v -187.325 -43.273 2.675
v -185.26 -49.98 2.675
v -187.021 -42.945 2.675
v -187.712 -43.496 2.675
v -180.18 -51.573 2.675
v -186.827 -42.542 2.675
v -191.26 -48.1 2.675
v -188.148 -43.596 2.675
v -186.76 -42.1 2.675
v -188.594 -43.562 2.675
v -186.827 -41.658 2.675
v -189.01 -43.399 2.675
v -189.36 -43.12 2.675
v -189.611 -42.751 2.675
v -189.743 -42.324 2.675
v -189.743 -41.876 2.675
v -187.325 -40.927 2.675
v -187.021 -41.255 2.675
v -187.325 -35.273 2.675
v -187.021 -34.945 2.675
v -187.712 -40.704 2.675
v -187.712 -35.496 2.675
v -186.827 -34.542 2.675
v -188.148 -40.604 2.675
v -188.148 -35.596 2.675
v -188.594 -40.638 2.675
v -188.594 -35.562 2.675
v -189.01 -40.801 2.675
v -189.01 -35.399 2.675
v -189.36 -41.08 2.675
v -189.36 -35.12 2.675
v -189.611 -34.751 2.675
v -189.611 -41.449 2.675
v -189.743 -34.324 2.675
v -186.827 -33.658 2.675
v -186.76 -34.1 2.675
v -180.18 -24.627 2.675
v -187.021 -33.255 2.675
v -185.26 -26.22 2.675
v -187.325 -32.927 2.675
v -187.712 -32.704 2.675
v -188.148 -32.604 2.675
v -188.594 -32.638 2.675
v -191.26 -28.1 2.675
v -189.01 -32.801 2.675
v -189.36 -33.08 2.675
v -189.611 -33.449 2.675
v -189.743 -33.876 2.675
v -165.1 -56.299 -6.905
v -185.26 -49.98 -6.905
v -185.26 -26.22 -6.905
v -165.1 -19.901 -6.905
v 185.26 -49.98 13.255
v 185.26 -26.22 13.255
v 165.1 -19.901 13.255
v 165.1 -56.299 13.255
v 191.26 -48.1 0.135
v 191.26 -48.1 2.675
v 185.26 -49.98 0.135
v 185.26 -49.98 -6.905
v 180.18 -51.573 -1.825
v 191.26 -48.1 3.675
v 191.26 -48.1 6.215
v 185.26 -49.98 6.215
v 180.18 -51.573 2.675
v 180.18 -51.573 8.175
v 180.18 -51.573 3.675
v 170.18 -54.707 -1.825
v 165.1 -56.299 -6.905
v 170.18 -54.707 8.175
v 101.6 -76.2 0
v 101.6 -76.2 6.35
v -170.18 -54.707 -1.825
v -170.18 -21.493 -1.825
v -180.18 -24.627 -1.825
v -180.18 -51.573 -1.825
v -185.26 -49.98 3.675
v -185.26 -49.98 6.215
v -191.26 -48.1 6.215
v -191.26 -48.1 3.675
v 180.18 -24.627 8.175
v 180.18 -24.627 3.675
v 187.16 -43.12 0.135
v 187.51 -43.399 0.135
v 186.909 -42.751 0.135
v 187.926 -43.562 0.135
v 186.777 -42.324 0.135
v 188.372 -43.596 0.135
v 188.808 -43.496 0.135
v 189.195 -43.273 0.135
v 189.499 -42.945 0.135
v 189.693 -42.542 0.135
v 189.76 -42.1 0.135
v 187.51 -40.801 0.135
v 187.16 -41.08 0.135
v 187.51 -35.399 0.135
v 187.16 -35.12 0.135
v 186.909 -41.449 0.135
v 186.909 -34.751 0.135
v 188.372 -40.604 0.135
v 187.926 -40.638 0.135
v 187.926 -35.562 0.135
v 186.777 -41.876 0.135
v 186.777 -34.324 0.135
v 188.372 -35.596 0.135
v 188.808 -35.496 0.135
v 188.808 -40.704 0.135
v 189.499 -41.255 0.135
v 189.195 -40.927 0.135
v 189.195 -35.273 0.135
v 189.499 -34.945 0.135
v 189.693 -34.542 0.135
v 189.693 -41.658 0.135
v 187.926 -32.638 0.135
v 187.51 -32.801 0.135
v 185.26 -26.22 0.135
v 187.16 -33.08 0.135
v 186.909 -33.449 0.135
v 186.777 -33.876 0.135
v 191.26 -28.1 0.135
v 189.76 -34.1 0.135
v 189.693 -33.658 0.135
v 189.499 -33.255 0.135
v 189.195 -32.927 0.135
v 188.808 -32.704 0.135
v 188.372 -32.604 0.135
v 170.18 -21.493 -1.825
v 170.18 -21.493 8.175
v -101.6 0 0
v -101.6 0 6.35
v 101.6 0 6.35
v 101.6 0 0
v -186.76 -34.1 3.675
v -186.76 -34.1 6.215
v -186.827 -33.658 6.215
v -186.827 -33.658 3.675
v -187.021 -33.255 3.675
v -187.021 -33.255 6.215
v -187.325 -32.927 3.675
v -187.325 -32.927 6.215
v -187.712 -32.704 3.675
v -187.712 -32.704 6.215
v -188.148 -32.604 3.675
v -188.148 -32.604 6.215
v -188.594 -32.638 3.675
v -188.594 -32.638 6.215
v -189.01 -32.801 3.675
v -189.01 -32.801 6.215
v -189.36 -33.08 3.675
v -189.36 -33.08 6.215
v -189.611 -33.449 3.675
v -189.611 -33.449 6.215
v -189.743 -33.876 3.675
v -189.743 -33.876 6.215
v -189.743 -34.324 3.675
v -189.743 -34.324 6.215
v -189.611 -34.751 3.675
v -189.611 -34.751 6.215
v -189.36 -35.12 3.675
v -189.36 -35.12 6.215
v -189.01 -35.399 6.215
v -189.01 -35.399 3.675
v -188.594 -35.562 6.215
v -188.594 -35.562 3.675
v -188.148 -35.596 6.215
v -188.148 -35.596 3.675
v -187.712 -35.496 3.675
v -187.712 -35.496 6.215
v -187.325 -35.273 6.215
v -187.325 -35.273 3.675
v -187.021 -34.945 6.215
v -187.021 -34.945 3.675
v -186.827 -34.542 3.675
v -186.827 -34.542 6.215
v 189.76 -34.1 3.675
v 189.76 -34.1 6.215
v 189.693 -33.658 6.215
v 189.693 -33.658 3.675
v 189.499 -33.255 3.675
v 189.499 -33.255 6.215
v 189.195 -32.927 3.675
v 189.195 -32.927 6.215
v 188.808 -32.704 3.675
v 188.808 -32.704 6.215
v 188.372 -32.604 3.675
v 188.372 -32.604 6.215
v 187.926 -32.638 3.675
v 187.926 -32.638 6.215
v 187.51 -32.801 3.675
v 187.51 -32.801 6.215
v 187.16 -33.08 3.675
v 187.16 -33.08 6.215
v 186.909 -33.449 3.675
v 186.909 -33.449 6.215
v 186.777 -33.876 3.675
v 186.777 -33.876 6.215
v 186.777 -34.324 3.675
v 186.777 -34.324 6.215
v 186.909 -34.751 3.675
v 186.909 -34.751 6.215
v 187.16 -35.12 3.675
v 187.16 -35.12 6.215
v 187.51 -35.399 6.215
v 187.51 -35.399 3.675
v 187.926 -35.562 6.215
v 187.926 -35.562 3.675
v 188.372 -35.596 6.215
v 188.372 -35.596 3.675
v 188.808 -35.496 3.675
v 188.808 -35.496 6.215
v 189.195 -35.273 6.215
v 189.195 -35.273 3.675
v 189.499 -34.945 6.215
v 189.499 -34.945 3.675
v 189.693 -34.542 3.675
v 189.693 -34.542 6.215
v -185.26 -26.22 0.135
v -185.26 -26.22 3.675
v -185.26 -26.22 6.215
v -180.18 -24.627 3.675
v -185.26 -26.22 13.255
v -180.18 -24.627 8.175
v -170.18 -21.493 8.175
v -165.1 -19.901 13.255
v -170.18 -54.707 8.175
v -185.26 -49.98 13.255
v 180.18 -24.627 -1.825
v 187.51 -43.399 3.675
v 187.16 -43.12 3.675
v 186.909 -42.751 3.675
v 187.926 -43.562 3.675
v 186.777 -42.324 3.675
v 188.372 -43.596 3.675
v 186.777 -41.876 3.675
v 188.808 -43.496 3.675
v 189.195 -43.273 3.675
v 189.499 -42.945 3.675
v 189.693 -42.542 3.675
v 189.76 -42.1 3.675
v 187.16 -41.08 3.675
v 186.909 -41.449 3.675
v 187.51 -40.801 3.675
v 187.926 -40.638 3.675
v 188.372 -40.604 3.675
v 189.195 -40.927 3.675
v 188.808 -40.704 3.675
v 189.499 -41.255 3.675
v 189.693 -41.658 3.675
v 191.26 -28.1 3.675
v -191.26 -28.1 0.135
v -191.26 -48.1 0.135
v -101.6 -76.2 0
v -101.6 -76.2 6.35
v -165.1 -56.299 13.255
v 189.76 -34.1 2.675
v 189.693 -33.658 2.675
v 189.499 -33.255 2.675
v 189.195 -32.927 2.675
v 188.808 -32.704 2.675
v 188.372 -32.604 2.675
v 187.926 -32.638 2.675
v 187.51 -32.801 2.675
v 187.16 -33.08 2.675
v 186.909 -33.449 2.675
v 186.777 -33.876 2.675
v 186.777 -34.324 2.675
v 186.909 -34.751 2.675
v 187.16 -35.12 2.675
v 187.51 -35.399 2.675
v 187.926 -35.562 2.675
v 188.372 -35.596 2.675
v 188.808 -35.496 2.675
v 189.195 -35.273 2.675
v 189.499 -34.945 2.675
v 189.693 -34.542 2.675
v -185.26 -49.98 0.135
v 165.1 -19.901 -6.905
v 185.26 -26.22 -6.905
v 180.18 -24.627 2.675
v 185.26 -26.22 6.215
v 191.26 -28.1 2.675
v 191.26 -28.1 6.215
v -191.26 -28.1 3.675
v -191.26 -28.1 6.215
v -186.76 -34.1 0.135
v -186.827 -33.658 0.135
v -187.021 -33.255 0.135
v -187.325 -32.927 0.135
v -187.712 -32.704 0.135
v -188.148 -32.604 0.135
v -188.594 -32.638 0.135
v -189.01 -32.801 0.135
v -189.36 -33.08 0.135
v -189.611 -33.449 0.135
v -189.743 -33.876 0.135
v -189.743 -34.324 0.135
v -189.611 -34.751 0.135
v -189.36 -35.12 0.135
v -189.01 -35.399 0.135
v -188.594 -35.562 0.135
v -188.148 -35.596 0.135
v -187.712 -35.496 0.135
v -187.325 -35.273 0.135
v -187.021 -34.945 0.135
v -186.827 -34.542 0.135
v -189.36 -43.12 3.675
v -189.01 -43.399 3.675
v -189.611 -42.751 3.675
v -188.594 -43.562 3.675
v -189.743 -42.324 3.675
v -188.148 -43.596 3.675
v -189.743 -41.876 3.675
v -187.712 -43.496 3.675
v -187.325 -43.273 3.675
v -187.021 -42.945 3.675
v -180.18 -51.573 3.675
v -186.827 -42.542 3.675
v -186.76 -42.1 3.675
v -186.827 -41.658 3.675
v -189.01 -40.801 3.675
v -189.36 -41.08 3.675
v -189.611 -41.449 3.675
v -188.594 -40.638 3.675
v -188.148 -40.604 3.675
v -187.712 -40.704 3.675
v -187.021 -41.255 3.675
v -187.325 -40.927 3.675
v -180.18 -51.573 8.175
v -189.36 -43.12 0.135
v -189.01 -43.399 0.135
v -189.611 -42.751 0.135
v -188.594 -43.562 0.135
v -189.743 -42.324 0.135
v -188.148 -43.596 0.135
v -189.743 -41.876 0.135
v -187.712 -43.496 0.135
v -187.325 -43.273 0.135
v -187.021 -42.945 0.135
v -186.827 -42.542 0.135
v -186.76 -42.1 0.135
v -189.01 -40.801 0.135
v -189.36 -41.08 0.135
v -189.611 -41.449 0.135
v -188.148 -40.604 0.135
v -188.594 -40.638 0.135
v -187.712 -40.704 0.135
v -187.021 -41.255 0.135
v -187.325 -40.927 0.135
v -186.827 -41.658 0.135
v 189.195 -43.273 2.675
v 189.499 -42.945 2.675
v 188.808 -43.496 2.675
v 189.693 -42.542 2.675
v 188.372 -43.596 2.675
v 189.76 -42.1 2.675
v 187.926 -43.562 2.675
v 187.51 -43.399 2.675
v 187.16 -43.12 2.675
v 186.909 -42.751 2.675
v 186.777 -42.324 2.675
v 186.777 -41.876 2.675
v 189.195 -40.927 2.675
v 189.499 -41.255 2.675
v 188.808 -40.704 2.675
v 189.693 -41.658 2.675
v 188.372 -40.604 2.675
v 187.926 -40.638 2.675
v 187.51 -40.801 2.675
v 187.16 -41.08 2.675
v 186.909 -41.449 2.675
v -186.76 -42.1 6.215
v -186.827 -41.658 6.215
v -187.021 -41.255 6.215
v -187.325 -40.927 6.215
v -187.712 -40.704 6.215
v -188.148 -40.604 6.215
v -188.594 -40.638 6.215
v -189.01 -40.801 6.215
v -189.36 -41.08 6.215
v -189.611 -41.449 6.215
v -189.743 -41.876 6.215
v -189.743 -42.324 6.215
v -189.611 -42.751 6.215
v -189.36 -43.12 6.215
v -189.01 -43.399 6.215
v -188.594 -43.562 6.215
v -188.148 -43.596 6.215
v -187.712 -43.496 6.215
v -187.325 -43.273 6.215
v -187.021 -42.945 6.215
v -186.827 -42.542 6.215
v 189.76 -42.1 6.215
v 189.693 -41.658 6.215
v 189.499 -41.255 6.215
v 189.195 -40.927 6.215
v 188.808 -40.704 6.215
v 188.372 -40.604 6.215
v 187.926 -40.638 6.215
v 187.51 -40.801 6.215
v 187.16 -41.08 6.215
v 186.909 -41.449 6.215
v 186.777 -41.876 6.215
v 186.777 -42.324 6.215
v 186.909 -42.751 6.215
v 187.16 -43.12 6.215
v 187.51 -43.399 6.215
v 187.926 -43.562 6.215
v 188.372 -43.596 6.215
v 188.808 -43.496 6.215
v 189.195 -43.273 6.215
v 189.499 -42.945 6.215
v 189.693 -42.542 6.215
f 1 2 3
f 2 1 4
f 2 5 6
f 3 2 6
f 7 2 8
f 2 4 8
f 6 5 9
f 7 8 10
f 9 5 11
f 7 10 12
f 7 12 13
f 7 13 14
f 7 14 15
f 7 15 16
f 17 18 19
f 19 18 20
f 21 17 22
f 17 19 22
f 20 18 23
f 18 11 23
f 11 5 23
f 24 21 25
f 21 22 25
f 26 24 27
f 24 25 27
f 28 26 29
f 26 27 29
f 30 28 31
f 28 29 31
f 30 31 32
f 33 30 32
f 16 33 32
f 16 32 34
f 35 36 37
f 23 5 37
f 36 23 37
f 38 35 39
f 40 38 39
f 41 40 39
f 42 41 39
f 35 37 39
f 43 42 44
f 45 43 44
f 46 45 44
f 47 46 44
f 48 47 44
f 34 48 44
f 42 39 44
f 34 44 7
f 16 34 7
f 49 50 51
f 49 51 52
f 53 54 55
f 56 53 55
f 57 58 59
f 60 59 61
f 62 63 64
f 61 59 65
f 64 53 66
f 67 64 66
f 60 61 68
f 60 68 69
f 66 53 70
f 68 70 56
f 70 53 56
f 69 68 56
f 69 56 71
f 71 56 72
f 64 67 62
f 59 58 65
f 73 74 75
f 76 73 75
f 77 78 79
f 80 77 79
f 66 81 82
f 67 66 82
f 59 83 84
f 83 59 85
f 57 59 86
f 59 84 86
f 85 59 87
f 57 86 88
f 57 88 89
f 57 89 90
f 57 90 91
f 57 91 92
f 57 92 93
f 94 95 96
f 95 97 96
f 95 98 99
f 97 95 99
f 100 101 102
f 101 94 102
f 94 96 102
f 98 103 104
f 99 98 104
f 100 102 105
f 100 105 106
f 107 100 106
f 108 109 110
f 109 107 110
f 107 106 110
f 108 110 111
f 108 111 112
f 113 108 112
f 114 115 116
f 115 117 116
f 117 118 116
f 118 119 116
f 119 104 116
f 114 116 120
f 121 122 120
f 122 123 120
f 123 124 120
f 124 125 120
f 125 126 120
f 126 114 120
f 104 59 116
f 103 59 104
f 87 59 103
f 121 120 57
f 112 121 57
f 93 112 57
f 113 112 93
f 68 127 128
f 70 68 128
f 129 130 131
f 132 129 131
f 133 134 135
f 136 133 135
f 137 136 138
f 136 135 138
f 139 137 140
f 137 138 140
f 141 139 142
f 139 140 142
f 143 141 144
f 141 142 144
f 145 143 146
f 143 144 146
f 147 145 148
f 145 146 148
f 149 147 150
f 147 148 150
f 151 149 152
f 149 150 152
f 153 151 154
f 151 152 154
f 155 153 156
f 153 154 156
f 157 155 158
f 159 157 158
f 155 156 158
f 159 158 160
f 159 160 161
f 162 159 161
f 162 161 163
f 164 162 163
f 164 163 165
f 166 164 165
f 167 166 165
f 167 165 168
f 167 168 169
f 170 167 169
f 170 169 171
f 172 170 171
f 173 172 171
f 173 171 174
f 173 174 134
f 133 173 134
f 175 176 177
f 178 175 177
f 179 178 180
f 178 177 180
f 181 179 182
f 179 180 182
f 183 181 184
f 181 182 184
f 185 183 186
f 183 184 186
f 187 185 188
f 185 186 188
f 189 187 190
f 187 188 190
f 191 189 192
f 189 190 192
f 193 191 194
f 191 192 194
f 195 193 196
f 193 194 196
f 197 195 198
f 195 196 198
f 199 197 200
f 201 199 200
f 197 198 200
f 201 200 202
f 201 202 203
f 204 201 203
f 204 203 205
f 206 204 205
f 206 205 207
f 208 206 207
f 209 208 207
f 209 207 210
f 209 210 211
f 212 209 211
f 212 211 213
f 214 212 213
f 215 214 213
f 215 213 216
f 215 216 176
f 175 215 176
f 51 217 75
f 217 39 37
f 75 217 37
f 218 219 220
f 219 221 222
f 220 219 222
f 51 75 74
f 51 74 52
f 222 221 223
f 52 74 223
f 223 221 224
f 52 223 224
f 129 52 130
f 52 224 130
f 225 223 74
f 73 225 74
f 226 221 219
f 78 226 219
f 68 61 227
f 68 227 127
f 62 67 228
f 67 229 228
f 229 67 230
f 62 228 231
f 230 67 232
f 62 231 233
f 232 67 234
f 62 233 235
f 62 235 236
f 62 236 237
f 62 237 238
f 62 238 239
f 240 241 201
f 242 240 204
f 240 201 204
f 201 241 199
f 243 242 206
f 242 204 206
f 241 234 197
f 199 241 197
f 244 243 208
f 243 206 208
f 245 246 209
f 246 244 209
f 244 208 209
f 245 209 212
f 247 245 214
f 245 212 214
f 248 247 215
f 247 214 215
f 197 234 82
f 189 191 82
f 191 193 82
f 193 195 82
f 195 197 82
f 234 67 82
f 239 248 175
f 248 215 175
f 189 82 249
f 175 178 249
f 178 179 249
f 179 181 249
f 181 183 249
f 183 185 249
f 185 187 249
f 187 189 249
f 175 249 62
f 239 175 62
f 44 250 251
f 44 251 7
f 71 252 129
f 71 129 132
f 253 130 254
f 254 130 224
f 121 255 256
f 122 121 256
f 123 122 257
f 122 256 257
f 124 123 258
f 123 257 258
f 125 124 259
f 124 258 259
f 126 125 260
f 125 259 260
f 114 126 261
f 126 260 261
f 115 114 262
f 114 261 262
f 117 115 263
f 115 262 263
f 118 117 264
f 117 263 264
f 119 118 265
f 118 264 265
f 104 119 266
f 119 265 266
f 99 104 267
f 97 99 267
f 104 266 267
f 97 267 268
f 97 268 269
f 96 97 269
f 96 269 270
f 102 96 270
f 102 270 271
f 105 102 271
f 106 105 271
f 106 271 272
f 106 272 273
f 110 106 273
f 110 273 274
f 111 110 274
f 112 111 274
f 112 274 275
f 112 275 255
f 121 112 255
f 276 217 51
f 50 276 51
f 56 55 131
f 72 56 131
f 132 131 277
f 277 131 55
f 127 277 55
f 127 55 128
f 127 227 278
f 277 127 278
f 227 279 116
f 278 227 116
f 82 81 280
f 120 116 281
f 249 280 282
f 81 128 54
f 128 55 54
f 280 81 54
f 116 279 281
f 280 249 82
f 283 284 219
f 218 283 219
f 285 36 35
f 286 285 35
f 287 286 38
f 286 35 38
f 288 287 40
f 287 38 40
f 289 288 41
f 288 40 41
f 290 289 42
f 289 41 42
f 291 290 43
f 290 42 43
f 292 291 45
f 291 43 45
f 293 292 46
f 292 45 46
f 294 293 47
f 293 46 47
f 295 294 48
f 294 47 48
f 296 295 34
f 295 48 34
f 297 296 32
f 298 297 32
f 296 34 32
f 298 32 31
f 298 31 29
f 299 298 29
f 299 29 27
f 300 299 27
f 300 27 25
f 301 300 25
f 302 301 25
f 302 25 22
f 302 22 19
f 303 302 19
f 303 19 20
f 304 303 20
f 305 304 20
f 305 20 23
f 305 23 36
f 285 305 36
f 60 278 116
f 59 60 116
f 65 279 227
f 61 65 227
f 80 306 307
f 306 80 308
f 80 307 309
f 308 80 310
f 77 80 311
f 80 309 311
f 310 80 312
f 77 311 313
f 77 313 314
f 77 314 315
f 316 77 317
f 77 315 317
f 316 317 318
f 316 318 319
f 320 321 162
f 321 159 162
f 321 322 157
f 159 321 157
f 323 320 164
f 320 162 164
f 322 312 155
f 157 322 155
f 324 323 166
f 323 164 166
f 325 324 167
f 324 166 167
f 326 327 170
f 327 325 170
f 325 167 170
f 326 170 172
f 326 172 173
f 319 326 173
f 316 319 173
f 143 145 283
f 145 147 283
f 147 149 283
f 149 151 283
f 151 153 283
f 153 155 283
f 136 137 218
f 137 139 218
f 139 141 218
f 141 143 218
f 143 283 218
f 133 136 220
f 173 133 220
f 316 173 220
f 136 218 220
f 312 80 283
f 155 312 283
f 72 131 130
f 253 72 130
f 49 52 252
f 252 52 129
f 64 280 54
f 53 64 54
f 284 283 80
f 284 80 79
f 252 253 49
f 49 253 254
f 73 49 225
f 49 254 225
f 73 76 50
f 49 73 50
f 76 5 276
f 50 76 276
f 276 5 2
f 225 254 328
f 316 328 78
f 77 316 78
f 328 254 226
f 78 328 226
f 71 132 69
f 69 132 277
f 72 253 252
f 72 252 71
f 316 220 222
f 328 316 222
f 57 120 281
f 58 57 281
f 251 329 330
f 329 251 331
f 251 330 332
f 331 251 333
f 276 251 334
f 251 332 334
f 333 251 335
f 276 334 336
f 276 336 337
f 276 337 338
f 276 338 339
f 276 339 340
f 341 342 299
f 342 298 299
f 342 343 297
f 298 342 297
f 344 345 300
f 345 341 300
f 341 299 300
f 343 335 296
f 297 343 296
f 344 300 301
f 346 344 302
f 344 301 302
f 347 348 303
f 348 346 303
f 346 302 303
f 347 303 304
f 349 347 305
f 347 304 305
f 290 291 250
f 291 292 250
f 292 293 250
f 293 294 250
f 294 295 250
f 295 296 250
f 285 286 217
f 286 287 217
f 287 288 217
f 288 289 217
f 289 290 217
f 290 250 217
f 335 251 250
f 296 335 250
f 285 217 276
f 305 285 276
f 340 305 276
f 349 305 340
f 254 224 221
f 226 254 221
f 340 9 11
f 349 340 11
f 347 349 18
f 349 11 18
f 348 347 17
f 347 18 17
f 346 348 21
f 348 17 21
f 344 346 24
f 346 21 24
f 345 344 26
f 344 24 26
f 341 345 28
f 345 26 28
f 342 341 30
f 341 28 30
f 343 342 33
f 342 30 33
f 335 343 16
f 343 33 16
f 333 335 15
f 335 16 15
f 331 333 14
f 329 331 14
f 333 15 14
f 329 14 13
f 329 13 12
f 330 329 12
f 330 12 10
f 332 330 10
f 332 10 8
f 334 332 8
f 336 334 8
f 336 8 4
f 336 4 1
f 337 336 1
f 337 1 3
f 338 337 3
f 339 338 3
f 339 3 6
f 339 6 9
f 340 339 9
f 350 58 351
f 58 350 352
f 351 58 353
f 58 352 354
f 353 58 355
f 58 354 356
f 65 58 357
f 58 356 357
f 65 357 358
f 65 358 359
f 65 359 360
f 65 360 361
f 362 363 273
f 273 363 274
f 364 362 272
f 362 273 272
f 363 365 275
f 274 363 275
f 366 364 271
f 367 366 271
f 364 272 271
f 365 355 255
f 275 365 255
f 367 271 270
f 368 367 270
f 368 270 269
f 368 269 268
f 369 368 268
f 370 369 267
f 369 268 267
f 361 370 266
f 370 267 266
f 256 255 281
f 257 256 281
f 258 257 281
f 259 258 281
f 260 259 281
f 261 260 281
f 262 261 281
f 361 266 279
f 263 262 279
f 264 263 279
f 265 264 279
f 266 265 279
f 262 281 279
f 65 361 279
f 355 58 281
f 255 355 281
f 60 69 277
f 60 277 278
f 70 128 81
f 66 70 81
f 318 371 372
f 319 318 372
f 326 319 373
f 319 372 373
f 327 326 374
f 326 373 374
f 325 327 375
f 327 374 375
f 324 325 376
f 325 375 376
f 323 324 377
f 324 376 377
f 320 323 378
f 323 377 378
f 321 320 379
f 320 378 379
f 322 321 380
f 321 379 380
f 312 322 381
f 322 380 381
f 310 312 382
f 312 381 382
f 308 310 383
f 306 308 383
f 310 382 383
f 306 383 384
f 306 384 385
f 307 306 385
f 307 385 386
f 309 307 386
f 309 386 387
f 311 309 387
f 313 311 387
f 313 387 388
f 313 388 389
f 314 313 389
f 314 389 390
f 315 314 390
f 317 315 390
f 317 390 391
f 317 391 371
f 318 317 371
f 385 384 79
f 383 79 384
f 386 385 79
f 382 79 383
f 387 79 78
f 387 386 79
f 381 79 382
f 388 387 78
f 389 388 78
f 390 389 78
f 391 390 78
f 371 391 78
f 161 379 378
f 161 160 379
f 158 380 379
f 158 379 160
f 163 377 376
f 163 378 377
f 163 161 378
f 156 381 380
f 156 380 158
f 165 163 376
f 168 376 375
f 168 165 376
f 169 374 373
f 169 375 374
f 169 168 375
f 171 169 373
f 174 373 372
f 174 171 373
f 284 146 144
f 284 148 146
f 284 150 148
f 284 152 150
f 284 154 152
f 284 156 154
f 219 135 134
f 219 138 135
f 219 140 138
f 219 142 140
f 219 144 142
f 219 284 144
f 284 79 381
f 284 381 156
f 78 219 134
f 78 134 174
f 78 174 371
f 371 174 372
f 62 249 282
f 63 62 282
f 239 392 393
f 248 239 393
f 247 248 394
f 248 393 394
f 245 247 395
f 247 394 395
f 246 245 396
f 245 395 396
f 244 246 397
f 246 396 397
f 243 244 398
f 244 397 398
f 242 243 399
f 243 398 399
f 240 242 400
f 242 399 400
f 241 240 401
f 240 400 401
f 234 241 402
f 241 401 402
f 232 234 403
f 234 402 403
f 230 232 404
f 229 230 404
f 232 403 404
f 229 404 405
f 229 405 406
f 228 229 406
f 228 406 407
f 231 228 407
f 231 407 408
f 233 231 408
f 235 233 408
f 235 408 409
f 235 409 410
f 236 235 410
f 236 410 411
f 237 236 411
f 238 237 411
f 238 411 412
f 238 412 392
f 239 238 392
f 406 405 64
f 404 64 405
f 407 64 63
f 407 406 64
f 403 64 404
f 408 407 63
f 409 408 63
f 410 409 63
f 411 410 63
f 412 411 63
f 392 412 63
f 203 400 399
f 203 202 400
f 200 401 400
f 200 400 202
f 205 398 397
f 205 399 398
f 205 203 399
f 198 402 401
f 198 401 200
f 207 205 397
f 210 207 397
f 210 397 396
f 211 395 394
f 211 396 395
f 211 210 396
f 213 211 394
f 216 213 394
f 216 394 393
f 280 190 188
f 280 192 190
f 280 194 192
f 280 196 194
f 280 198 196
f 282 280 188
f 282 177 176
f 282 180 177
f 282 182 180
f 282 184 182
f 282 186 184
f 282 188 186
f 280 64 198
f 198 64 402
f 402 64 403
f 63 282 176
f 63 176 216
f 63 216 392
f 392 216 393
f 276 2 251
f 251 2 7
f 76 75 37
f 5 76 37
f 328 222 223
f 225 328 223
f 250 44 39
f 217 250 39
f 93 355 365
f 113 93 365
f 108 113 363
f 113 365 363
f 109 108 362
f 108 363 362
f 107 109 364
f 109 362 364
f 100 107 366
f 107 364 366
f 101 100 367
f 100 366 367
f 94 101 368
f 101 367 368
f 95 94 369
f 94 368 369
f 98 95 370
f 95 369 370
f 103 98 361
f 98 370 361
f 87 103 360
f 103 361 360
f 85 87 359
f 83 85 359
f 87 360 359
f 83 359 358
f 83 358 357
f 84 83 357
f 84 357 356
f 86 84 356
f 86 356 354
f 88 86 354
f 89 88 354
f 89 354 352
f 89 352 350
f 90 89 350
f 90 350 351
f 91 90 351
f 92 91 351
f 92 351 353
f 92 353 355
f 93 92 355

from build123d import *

# Parameters (mm, degrees)
F0_W     = 6
F0_H     = 2.54
F0_W_2   = 63.5
F0_H_2   = 6.35
F0_W_3   = 101.6
F1_DEPTH = 76.2
F2_R     = 4.445
F2_R_2   = 1.5875
F3_DEPTH = 25.4
F4_R     = 1.5
F5_DEPTH = 13.121
F7_DEPTH = 20.161
F8_R     = 4.445
F8_R_2   = 1.5875
F9_DEPTH = 6.35


with BuildPart() as f1:
    # F0 (on Front) → F1 (new body)
    with BuildSketch(Plane.XZ):
        Polygon((-180.18, 3.675), (-180.18, 8.175), (-170.18, 8.175), (-170.18, -1.825), (-180.18, -1.825), (-180.18, 2.675), (-185.26, 2.675), (-185.26, 0.135), (-185.26, -6.905), (-165.1, -6.905), (-165.1, 0), (-165.1, 6.35), (-165.1, 13.255), (-185.26, 13.255), (-185.26, 6.215), (-185.26, 3.675), align=None)
        with Locations((-188.26, 4.945)):
            Rectangle(F0_W, F0_H)
        with Locations((-188.26, 1.405)):
            Rectangle(F0_W, F0_H)
        Polygon((-101.6, 6.35), (-165.1, 13.255), (-165.1, 6.35), align=None)
        with Locations((-133.35, 3.175)):
            Rectangle(F0_W_2, F0_H_2)
        with Locations((-50.8, 3.175)):
            Rectangle(F0_W_3, F0_H_2)
        Polygon((-101.6, 0), (-165.1, 0), (-165.1, -6.905), align=None)
        with Locations((50.8, 3.175)):
            Rectangle(F0_W_3, F0_H_2)
        with Locations((133.35, 3.175)):
            Rectangle(F0_W_2, F0_H_2)
        Polygon((165.1, 13.255), (101.6, 6.35), (165.1, 6.35), align=None)
        Polygon((165.1, 0), (101.6, 0), (165.1, -6.905), align=None)
        Polygon((165.1, 13.255), (165.1, 6.35), (165.1, 0), (165.1, -6.905), (185.26, -6.905), (185.26, 0.135), (185.26, 2.675), (180.18, 2.675), (180.18, -1.825), (170.18, -1.825), (170.18, 8.175), (180.18, 8.175), (180.18, 3.675), (185.26, 3.675), (185.26, 6.215), (185.26, 13.255), align=None)
        with Locations((188.26, 4.945)):
            Rectangle(F0_W, F0_H)
        with Locations((188.26, 1.405)):
            Rectangle(F0_W, F0_H)
    extrude(amount=F1_DEPTH)

    # F2 (on face) → F3 (cut)
    with BuildSketch(Plane.XY.offset(6.35)):
        with Locations((-38.1, -9.525)):
            Circle(F2_R)
        with Locations((38.1, -9.525)):
            Circle(F2_R)
        with Locations((38.1, -66.675)):
            Circle(F2_R)
        with Locations((-38.1, -66.675)):
            Circle(F2_R)
        with Locations((-22.9969, -15.1031)):
            Circle(F2_R_2)
        with Locations((22.9969, -61.0969)):
            Circle(F2_R_2)
        with Locations((22.9969, -15.1031)):
            Circle(F2_R_2)
        with Locations((-22.9969, -61.0969)):
            Circle(F2_R_2)
    extrude(amount=-F3_DEPTH, mode=Mode.SUBTRACT)

    # F4 (on face) → F5 (cut, through all)
    with BuildSketch(Plane.XY.offset(6.215)):
        with Locations((-188.26, -34.1)):
            Circle(F4_R)
        with Locations((-188.26, -42.1)):
            Circle(F4_R)
        with Locations((188.26, -42.1)):
            Circle(F4_R)
        with Locations((188.26, -34.1)):
            Circle(F4_R)
    extrude(amount=-F5_DEPTH, mode=Mode.SUBTRACT)

    # F6 (on face) → F7 (cut, through all)
    with BuildSketch(Plane.XY.offset(13.255)):
        Polygon((-165.1, -19.9012937765), (-101.6, 0), (-165.1, 0), align=None)
        Polygon((-185.26, -26.2195627928), (-165.1, -19.9012937765), (-165.1, 0), (-185.26, 0), align=None)
        Polygon((-191.26, -28.1), (-185.26, -26.2195627928), (-185.26, 0), (-191.26, 0), align=None)
        Polygon((-185.26, -76.2), (-185.26, -49.9804372072), (-191.26, -48.1), (-191.26, -76.2), align=None)
        Polygon((-165.1, -76.2), (-165.1, -56.2987062235), (-185.26, -49.9804372072), (-185.26, -76.2), align=None)
        Polygon((-101.6, -76.2), (-165.1, -56.2987062235), (-165.1, -76.2), align=None)
        Polygon((191.26, -48.1), (101.6, -76.2), (191.26, -76.2), align=None)
        Polygon((191.26, 0), (101.6, 0), (191.26, -28.1), align=None)
    extrude(amount=-F7_DEPTH, mode=Mode.SUBTRACT)

    # F8 (on face) → F9 (join, through all)
    with BuildSketch(Plane(origin=(0, 0, 0), x_dir=(1, 0, 0), z_dir=(0, 0, -1))):
        with Locations((-38.1, 66.675)):
            Circle(F8_R)
        with Locations((-38.1, 9.525)):
            Circle(F8_R)
        with Locations((-22.9969, 15.1031)):
            Circle(F8_R_2)
        with Locations((38.1, 9.525)):
            Circle(F8_R)
        with Locations((38.1, 66.675)):
            Circle(F8_R)
        with Locations((22.9969, 61.0969)):
            Circle(F8_R_2)
        with Locations((-22.9969, 61.0969)):
            Circle(F8_R_2)
        with Locations((22.9969, 15.1031)):
            Circle(F8_R_2)
    extrude(amount=-F9_DEPTH)


solid = f1.part
